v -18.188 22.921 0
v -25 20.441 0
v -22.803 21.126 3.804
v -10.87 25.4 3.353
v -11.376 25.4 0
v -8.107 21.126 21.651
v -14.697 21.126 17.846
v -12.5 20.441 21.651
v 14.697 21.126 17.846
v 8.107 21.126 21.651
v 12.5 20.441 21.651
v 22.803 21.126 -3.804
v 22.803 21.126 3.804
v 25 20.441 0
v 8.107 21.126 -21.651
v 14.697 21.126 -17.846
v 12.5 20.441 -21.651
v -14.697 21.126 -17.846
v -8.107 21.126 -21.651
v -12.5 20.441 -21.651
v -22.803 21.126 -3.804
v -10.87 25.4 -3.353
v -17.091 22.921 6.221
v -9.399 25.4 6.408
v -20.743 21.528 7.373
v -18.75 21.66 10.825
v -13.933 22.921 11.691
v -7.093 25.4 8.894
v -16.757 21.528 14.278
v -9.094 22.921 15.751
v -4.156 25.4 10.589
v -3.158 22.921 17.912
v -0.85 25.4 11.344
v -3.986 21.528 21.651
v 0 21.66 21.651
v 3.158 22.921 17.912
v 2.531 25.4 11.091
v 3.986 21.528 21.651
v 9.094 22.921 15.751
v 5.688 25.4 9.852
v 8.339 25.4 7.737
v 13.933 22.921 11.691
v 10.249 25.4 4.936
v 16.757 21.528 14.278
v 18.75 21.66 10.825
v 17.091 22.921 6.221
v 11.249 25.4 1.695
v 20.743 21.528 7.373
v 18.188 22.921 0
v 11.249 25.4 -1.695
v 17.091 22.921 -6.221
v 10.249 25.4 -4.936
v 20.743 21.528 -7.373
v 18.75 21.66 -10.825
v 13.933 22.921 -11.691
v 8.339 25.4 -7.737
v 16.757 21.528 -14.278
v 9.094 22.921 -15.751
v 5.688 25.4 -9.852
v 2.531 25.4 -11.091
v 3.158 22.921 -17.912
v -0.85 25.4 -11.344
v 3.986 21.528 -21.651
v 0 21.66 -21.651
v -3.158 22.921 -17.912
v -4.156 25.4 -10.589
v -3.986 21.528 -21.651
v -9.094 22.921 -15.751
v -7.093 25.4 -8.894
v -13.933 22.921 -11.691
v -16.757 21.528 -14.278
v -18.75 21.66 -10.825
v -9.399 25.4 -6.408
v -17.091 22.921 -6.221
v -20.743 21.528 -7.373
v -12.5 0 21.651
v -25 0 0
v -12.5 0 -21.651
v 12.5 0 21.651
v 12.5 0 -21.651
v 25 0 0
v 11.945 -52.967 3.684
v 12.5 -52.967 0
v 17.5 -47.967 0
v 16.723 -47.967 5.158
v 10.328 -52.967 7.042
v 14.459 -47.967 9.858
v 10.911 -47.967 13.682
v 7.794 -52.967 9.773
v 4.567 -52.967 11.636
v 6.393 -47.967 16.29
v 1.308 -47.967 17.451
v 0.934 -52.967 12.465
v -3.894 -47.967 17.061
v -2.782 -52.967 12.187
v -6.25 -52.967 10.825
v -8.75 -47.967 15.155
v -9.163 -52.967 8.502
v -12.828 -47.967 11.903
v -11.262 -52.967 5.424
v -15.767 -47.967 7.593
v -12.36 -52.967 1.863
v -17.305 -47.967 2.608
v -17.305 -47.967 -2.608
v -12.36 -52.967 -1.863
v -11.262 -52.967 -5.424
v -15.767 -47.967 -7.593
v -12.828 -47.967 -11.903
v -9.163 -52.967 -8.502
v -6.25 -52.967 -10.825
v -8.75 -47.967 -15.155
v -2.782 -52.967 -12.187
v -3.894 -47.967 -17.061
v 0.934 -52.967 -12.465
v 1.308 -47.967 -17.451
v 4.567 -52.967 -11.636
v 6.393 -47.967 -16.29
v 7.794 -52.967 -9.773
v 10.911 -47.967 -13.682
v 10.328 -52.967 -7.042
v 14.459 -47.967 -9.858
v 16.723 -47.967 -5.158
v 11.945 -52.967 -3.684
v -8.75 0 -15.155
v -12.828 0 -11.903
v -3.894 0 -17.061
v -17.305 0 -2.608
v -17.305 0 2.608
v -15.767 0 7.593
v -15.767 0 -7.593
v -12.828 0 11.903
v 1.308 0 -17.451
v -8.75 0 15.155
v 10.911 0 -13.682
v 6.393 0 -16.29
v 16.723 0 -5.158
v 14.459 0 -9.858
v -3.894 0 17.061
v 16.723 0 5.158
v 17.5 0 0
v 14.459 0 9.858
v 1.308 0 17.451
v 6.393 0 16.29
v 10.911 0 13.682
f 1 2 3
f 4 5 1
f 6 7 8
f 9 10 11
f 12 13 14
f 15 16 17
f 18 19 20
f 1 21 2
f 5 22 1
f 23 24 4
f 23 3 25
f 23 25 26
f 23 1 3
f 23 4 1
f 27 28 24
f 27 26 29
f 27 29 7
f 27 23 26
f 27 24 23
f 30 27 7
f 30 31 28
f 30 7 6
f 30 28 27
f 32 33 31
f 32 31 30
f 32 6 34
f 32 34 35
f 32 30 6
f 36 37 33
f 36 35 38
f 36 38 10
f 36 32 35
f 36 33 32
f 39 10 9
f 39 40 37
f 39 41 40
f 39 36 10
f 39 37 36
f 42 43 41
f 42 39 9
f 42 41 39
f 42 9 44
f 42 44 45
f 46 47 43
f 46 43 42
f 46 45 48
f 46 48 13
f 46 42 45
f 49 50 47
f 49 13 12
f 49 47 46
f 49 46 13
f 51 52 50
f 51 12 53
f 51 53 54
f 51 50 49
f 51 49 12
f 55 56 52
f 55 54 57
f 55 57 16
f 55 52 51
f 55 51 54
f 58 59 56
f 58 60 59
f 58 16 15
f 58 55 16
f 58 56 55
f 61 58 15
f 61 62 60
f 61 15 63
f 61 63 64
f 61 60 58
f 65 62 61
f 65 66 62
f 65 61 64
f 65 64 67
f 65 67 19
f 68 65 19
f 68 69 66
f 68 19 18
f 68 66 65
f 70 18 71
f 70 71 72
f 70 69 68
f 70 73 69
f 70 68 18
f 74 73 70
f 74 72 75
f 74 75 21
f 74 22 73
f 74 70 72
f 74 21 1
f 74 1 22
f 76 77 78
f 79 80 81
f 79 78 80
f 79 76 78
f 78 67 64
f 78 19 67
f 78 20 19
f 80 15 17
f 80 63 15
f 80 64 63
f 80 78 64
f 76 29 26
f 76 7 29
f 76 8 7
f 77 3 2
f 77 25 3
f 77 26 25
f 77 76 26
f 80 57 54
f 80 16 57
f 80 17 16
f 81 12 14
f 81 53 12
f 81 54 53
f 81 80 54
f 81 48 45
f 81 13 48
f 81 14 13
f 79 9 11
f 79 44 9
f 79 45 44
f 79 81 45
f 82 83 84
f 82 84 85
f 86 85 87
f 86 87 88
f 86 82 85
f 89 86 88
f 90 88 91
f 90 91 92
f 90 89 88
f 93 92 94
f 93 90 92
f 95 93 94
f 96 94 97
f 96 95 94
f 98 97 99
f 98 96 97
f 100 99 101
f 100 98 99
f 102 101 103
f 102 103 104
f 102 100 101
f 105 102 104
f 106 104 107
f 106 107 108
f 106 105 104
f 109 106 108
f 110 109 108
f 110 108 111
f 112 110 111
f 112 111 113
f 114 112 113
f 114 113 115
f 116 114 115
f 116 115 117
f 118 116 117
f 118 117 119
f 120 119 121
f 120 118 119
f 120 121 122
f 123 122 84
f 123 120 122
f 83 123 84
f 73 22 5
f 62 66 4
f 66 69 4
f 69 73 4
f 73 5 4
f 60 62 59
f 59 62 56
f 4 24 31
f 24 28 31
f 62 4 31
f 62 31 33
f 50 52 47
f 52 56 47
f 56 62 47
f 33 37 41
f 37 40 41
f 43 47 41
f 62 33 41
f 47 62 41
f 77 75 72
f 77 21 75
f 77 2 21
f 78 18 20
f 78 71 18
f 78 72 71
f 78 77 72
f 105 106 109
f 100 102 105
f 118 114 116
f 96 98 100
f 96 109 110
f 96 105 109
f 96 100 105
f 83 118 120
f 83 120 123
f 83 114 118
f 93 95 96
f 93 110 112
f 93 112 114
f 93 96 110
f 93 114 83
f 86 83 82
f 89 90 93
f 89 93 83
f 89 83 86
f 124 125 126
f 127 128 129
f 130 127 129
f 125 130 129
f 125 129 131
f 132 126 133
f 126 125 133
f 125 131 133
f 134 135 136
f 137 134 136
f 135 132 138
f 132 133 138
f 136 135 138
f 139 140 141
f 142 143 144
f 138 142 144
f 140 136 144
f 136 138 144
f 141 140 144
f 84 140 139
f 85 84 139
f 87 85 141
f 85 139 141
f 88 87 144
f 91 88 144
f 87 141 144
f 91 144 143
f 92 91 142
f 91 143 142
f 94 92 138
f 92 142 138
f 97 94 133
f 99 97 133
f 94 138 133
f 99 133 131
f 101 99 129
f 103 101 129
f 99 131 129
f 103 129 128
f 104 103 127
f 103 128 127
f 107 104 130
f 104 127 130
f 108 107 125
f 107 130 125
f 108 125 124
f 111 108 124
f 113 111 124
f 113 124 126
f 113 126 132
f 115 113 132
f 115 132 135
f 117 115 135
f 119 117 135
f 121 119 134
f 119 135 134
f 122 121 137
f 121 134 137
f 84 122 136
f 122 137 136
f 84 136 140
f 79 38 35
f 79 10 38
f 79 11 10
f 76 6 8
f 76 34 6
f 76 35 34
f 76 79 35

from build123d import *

# Parameters (mm, degrees)
F1_DEPTH = 25.4
F2_R     = 17.5
F3_DEPTH = 52.966522
F6_SIZE  = 5


with BuildPart() as f1:
    # F0 (on Front) → F1 (new body)
    with BuildSketch(Plane.XZ):
        Polygon((12.5, -21.650635), (25, 0), (12.5, 21.650635), (-12.5, 21.650635), (-25, 0), (-12.5, -21.650635), align=None)
    extrude(amount=-F1_DEPTH)

    # F4 (on Top) → F5 (revolve, cut)
    with BuildSketch(Plane.XY):
        Polygon((-35, 35), (-35, 16.801488), (-10, 25.900744), (-10, 35), align=None)
    revolve(axis=Axis((0, 0, 0), (0, 1, 0)), mode=Mode.SUBTRACT)


with BuildPart() as f3:
    # F2 (on Front) → F3 (new body)
    with BuildSketch(Plane.XZ):
        Circle(F2_R)
    extrude(amount=F3_DEPTH)

    # F6
    f6_edges = [f3.edges().sort_by_distance(p)[0] for p in [
        (-17.5, -52.966522, 0),
    ]]
    chamfer(f6_edges, length=F6_SIZE)


solid = Compound([f1.part, f3.part])
